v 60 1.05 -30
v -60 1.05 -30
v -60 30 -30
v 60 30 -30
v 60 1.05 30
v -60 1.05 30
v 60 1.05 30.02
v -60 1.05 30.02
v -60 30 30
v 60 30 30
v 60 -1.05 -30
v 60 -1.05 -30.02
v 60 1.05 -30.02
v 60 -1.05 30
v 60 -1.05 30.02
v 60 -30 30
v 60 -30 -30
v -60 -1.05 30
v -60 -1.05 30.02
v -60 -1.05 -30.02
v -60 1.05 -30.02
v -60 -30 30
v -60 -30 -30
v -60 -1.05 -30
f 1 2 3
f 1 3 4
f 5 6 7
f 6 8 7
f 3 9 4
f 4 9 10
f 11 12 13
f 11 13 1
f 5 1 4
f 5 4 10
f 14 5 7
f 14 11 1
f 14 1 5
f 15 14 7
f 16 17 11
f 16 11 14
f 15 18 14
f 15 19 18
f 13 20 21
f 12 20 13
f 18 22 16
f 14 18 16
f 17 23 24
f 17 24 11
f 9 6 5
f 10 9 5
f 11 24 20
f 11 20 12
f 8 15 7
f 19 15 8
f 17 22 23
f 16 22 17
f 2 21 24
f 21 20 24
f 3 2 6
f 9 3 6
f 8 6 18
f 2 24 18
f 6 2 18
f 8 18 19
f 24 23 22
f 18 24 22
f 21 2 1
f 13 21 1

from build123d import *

# Parameters (mm, degrees)
F0_W     = 120
F0_H     = 60
F1_DEPTH = 30
F2_W     = 4.332021
F2_H     = 54.6
F2_W_2   = 4.302548
F3_DEPTH = 1.05


with BuildPart() as f1:
    # F0 (on Front) → F1 (new body, symmetric)
    with BuildSketch(Plane.XZ):
        Rectangle(F0_W, F0_H)
    extrude(amount=F1_DEPTH, both=True)

    # F2 (on Front) → F3 (join, symmetric)
    with BuildSketch(Plane.XZ):
        Polygon((59.720043, 27.3), (60, 27.3), (60, 30.02), (-60, 30.02), (-60, 27.3), (-55.697452, 27.3), (55.388022, 27.3), align=None)
        with Locations((57.554032, 0)):
            Rectangle(F2_W, F2_H)
        Polygon((60, -27.3), (59.720043, -27.3), (55.388022, -27.3), (-55.697452, -27.3), (-60, -27.3), (-60, -30.02), (60, -30.02), align=None)
        with Locations((-57.848726, 0)):
            Rectangle(F2_W_2, F2_H)
    extrude(amount=F3_DEPTH, both=True)


solid = f1.part
